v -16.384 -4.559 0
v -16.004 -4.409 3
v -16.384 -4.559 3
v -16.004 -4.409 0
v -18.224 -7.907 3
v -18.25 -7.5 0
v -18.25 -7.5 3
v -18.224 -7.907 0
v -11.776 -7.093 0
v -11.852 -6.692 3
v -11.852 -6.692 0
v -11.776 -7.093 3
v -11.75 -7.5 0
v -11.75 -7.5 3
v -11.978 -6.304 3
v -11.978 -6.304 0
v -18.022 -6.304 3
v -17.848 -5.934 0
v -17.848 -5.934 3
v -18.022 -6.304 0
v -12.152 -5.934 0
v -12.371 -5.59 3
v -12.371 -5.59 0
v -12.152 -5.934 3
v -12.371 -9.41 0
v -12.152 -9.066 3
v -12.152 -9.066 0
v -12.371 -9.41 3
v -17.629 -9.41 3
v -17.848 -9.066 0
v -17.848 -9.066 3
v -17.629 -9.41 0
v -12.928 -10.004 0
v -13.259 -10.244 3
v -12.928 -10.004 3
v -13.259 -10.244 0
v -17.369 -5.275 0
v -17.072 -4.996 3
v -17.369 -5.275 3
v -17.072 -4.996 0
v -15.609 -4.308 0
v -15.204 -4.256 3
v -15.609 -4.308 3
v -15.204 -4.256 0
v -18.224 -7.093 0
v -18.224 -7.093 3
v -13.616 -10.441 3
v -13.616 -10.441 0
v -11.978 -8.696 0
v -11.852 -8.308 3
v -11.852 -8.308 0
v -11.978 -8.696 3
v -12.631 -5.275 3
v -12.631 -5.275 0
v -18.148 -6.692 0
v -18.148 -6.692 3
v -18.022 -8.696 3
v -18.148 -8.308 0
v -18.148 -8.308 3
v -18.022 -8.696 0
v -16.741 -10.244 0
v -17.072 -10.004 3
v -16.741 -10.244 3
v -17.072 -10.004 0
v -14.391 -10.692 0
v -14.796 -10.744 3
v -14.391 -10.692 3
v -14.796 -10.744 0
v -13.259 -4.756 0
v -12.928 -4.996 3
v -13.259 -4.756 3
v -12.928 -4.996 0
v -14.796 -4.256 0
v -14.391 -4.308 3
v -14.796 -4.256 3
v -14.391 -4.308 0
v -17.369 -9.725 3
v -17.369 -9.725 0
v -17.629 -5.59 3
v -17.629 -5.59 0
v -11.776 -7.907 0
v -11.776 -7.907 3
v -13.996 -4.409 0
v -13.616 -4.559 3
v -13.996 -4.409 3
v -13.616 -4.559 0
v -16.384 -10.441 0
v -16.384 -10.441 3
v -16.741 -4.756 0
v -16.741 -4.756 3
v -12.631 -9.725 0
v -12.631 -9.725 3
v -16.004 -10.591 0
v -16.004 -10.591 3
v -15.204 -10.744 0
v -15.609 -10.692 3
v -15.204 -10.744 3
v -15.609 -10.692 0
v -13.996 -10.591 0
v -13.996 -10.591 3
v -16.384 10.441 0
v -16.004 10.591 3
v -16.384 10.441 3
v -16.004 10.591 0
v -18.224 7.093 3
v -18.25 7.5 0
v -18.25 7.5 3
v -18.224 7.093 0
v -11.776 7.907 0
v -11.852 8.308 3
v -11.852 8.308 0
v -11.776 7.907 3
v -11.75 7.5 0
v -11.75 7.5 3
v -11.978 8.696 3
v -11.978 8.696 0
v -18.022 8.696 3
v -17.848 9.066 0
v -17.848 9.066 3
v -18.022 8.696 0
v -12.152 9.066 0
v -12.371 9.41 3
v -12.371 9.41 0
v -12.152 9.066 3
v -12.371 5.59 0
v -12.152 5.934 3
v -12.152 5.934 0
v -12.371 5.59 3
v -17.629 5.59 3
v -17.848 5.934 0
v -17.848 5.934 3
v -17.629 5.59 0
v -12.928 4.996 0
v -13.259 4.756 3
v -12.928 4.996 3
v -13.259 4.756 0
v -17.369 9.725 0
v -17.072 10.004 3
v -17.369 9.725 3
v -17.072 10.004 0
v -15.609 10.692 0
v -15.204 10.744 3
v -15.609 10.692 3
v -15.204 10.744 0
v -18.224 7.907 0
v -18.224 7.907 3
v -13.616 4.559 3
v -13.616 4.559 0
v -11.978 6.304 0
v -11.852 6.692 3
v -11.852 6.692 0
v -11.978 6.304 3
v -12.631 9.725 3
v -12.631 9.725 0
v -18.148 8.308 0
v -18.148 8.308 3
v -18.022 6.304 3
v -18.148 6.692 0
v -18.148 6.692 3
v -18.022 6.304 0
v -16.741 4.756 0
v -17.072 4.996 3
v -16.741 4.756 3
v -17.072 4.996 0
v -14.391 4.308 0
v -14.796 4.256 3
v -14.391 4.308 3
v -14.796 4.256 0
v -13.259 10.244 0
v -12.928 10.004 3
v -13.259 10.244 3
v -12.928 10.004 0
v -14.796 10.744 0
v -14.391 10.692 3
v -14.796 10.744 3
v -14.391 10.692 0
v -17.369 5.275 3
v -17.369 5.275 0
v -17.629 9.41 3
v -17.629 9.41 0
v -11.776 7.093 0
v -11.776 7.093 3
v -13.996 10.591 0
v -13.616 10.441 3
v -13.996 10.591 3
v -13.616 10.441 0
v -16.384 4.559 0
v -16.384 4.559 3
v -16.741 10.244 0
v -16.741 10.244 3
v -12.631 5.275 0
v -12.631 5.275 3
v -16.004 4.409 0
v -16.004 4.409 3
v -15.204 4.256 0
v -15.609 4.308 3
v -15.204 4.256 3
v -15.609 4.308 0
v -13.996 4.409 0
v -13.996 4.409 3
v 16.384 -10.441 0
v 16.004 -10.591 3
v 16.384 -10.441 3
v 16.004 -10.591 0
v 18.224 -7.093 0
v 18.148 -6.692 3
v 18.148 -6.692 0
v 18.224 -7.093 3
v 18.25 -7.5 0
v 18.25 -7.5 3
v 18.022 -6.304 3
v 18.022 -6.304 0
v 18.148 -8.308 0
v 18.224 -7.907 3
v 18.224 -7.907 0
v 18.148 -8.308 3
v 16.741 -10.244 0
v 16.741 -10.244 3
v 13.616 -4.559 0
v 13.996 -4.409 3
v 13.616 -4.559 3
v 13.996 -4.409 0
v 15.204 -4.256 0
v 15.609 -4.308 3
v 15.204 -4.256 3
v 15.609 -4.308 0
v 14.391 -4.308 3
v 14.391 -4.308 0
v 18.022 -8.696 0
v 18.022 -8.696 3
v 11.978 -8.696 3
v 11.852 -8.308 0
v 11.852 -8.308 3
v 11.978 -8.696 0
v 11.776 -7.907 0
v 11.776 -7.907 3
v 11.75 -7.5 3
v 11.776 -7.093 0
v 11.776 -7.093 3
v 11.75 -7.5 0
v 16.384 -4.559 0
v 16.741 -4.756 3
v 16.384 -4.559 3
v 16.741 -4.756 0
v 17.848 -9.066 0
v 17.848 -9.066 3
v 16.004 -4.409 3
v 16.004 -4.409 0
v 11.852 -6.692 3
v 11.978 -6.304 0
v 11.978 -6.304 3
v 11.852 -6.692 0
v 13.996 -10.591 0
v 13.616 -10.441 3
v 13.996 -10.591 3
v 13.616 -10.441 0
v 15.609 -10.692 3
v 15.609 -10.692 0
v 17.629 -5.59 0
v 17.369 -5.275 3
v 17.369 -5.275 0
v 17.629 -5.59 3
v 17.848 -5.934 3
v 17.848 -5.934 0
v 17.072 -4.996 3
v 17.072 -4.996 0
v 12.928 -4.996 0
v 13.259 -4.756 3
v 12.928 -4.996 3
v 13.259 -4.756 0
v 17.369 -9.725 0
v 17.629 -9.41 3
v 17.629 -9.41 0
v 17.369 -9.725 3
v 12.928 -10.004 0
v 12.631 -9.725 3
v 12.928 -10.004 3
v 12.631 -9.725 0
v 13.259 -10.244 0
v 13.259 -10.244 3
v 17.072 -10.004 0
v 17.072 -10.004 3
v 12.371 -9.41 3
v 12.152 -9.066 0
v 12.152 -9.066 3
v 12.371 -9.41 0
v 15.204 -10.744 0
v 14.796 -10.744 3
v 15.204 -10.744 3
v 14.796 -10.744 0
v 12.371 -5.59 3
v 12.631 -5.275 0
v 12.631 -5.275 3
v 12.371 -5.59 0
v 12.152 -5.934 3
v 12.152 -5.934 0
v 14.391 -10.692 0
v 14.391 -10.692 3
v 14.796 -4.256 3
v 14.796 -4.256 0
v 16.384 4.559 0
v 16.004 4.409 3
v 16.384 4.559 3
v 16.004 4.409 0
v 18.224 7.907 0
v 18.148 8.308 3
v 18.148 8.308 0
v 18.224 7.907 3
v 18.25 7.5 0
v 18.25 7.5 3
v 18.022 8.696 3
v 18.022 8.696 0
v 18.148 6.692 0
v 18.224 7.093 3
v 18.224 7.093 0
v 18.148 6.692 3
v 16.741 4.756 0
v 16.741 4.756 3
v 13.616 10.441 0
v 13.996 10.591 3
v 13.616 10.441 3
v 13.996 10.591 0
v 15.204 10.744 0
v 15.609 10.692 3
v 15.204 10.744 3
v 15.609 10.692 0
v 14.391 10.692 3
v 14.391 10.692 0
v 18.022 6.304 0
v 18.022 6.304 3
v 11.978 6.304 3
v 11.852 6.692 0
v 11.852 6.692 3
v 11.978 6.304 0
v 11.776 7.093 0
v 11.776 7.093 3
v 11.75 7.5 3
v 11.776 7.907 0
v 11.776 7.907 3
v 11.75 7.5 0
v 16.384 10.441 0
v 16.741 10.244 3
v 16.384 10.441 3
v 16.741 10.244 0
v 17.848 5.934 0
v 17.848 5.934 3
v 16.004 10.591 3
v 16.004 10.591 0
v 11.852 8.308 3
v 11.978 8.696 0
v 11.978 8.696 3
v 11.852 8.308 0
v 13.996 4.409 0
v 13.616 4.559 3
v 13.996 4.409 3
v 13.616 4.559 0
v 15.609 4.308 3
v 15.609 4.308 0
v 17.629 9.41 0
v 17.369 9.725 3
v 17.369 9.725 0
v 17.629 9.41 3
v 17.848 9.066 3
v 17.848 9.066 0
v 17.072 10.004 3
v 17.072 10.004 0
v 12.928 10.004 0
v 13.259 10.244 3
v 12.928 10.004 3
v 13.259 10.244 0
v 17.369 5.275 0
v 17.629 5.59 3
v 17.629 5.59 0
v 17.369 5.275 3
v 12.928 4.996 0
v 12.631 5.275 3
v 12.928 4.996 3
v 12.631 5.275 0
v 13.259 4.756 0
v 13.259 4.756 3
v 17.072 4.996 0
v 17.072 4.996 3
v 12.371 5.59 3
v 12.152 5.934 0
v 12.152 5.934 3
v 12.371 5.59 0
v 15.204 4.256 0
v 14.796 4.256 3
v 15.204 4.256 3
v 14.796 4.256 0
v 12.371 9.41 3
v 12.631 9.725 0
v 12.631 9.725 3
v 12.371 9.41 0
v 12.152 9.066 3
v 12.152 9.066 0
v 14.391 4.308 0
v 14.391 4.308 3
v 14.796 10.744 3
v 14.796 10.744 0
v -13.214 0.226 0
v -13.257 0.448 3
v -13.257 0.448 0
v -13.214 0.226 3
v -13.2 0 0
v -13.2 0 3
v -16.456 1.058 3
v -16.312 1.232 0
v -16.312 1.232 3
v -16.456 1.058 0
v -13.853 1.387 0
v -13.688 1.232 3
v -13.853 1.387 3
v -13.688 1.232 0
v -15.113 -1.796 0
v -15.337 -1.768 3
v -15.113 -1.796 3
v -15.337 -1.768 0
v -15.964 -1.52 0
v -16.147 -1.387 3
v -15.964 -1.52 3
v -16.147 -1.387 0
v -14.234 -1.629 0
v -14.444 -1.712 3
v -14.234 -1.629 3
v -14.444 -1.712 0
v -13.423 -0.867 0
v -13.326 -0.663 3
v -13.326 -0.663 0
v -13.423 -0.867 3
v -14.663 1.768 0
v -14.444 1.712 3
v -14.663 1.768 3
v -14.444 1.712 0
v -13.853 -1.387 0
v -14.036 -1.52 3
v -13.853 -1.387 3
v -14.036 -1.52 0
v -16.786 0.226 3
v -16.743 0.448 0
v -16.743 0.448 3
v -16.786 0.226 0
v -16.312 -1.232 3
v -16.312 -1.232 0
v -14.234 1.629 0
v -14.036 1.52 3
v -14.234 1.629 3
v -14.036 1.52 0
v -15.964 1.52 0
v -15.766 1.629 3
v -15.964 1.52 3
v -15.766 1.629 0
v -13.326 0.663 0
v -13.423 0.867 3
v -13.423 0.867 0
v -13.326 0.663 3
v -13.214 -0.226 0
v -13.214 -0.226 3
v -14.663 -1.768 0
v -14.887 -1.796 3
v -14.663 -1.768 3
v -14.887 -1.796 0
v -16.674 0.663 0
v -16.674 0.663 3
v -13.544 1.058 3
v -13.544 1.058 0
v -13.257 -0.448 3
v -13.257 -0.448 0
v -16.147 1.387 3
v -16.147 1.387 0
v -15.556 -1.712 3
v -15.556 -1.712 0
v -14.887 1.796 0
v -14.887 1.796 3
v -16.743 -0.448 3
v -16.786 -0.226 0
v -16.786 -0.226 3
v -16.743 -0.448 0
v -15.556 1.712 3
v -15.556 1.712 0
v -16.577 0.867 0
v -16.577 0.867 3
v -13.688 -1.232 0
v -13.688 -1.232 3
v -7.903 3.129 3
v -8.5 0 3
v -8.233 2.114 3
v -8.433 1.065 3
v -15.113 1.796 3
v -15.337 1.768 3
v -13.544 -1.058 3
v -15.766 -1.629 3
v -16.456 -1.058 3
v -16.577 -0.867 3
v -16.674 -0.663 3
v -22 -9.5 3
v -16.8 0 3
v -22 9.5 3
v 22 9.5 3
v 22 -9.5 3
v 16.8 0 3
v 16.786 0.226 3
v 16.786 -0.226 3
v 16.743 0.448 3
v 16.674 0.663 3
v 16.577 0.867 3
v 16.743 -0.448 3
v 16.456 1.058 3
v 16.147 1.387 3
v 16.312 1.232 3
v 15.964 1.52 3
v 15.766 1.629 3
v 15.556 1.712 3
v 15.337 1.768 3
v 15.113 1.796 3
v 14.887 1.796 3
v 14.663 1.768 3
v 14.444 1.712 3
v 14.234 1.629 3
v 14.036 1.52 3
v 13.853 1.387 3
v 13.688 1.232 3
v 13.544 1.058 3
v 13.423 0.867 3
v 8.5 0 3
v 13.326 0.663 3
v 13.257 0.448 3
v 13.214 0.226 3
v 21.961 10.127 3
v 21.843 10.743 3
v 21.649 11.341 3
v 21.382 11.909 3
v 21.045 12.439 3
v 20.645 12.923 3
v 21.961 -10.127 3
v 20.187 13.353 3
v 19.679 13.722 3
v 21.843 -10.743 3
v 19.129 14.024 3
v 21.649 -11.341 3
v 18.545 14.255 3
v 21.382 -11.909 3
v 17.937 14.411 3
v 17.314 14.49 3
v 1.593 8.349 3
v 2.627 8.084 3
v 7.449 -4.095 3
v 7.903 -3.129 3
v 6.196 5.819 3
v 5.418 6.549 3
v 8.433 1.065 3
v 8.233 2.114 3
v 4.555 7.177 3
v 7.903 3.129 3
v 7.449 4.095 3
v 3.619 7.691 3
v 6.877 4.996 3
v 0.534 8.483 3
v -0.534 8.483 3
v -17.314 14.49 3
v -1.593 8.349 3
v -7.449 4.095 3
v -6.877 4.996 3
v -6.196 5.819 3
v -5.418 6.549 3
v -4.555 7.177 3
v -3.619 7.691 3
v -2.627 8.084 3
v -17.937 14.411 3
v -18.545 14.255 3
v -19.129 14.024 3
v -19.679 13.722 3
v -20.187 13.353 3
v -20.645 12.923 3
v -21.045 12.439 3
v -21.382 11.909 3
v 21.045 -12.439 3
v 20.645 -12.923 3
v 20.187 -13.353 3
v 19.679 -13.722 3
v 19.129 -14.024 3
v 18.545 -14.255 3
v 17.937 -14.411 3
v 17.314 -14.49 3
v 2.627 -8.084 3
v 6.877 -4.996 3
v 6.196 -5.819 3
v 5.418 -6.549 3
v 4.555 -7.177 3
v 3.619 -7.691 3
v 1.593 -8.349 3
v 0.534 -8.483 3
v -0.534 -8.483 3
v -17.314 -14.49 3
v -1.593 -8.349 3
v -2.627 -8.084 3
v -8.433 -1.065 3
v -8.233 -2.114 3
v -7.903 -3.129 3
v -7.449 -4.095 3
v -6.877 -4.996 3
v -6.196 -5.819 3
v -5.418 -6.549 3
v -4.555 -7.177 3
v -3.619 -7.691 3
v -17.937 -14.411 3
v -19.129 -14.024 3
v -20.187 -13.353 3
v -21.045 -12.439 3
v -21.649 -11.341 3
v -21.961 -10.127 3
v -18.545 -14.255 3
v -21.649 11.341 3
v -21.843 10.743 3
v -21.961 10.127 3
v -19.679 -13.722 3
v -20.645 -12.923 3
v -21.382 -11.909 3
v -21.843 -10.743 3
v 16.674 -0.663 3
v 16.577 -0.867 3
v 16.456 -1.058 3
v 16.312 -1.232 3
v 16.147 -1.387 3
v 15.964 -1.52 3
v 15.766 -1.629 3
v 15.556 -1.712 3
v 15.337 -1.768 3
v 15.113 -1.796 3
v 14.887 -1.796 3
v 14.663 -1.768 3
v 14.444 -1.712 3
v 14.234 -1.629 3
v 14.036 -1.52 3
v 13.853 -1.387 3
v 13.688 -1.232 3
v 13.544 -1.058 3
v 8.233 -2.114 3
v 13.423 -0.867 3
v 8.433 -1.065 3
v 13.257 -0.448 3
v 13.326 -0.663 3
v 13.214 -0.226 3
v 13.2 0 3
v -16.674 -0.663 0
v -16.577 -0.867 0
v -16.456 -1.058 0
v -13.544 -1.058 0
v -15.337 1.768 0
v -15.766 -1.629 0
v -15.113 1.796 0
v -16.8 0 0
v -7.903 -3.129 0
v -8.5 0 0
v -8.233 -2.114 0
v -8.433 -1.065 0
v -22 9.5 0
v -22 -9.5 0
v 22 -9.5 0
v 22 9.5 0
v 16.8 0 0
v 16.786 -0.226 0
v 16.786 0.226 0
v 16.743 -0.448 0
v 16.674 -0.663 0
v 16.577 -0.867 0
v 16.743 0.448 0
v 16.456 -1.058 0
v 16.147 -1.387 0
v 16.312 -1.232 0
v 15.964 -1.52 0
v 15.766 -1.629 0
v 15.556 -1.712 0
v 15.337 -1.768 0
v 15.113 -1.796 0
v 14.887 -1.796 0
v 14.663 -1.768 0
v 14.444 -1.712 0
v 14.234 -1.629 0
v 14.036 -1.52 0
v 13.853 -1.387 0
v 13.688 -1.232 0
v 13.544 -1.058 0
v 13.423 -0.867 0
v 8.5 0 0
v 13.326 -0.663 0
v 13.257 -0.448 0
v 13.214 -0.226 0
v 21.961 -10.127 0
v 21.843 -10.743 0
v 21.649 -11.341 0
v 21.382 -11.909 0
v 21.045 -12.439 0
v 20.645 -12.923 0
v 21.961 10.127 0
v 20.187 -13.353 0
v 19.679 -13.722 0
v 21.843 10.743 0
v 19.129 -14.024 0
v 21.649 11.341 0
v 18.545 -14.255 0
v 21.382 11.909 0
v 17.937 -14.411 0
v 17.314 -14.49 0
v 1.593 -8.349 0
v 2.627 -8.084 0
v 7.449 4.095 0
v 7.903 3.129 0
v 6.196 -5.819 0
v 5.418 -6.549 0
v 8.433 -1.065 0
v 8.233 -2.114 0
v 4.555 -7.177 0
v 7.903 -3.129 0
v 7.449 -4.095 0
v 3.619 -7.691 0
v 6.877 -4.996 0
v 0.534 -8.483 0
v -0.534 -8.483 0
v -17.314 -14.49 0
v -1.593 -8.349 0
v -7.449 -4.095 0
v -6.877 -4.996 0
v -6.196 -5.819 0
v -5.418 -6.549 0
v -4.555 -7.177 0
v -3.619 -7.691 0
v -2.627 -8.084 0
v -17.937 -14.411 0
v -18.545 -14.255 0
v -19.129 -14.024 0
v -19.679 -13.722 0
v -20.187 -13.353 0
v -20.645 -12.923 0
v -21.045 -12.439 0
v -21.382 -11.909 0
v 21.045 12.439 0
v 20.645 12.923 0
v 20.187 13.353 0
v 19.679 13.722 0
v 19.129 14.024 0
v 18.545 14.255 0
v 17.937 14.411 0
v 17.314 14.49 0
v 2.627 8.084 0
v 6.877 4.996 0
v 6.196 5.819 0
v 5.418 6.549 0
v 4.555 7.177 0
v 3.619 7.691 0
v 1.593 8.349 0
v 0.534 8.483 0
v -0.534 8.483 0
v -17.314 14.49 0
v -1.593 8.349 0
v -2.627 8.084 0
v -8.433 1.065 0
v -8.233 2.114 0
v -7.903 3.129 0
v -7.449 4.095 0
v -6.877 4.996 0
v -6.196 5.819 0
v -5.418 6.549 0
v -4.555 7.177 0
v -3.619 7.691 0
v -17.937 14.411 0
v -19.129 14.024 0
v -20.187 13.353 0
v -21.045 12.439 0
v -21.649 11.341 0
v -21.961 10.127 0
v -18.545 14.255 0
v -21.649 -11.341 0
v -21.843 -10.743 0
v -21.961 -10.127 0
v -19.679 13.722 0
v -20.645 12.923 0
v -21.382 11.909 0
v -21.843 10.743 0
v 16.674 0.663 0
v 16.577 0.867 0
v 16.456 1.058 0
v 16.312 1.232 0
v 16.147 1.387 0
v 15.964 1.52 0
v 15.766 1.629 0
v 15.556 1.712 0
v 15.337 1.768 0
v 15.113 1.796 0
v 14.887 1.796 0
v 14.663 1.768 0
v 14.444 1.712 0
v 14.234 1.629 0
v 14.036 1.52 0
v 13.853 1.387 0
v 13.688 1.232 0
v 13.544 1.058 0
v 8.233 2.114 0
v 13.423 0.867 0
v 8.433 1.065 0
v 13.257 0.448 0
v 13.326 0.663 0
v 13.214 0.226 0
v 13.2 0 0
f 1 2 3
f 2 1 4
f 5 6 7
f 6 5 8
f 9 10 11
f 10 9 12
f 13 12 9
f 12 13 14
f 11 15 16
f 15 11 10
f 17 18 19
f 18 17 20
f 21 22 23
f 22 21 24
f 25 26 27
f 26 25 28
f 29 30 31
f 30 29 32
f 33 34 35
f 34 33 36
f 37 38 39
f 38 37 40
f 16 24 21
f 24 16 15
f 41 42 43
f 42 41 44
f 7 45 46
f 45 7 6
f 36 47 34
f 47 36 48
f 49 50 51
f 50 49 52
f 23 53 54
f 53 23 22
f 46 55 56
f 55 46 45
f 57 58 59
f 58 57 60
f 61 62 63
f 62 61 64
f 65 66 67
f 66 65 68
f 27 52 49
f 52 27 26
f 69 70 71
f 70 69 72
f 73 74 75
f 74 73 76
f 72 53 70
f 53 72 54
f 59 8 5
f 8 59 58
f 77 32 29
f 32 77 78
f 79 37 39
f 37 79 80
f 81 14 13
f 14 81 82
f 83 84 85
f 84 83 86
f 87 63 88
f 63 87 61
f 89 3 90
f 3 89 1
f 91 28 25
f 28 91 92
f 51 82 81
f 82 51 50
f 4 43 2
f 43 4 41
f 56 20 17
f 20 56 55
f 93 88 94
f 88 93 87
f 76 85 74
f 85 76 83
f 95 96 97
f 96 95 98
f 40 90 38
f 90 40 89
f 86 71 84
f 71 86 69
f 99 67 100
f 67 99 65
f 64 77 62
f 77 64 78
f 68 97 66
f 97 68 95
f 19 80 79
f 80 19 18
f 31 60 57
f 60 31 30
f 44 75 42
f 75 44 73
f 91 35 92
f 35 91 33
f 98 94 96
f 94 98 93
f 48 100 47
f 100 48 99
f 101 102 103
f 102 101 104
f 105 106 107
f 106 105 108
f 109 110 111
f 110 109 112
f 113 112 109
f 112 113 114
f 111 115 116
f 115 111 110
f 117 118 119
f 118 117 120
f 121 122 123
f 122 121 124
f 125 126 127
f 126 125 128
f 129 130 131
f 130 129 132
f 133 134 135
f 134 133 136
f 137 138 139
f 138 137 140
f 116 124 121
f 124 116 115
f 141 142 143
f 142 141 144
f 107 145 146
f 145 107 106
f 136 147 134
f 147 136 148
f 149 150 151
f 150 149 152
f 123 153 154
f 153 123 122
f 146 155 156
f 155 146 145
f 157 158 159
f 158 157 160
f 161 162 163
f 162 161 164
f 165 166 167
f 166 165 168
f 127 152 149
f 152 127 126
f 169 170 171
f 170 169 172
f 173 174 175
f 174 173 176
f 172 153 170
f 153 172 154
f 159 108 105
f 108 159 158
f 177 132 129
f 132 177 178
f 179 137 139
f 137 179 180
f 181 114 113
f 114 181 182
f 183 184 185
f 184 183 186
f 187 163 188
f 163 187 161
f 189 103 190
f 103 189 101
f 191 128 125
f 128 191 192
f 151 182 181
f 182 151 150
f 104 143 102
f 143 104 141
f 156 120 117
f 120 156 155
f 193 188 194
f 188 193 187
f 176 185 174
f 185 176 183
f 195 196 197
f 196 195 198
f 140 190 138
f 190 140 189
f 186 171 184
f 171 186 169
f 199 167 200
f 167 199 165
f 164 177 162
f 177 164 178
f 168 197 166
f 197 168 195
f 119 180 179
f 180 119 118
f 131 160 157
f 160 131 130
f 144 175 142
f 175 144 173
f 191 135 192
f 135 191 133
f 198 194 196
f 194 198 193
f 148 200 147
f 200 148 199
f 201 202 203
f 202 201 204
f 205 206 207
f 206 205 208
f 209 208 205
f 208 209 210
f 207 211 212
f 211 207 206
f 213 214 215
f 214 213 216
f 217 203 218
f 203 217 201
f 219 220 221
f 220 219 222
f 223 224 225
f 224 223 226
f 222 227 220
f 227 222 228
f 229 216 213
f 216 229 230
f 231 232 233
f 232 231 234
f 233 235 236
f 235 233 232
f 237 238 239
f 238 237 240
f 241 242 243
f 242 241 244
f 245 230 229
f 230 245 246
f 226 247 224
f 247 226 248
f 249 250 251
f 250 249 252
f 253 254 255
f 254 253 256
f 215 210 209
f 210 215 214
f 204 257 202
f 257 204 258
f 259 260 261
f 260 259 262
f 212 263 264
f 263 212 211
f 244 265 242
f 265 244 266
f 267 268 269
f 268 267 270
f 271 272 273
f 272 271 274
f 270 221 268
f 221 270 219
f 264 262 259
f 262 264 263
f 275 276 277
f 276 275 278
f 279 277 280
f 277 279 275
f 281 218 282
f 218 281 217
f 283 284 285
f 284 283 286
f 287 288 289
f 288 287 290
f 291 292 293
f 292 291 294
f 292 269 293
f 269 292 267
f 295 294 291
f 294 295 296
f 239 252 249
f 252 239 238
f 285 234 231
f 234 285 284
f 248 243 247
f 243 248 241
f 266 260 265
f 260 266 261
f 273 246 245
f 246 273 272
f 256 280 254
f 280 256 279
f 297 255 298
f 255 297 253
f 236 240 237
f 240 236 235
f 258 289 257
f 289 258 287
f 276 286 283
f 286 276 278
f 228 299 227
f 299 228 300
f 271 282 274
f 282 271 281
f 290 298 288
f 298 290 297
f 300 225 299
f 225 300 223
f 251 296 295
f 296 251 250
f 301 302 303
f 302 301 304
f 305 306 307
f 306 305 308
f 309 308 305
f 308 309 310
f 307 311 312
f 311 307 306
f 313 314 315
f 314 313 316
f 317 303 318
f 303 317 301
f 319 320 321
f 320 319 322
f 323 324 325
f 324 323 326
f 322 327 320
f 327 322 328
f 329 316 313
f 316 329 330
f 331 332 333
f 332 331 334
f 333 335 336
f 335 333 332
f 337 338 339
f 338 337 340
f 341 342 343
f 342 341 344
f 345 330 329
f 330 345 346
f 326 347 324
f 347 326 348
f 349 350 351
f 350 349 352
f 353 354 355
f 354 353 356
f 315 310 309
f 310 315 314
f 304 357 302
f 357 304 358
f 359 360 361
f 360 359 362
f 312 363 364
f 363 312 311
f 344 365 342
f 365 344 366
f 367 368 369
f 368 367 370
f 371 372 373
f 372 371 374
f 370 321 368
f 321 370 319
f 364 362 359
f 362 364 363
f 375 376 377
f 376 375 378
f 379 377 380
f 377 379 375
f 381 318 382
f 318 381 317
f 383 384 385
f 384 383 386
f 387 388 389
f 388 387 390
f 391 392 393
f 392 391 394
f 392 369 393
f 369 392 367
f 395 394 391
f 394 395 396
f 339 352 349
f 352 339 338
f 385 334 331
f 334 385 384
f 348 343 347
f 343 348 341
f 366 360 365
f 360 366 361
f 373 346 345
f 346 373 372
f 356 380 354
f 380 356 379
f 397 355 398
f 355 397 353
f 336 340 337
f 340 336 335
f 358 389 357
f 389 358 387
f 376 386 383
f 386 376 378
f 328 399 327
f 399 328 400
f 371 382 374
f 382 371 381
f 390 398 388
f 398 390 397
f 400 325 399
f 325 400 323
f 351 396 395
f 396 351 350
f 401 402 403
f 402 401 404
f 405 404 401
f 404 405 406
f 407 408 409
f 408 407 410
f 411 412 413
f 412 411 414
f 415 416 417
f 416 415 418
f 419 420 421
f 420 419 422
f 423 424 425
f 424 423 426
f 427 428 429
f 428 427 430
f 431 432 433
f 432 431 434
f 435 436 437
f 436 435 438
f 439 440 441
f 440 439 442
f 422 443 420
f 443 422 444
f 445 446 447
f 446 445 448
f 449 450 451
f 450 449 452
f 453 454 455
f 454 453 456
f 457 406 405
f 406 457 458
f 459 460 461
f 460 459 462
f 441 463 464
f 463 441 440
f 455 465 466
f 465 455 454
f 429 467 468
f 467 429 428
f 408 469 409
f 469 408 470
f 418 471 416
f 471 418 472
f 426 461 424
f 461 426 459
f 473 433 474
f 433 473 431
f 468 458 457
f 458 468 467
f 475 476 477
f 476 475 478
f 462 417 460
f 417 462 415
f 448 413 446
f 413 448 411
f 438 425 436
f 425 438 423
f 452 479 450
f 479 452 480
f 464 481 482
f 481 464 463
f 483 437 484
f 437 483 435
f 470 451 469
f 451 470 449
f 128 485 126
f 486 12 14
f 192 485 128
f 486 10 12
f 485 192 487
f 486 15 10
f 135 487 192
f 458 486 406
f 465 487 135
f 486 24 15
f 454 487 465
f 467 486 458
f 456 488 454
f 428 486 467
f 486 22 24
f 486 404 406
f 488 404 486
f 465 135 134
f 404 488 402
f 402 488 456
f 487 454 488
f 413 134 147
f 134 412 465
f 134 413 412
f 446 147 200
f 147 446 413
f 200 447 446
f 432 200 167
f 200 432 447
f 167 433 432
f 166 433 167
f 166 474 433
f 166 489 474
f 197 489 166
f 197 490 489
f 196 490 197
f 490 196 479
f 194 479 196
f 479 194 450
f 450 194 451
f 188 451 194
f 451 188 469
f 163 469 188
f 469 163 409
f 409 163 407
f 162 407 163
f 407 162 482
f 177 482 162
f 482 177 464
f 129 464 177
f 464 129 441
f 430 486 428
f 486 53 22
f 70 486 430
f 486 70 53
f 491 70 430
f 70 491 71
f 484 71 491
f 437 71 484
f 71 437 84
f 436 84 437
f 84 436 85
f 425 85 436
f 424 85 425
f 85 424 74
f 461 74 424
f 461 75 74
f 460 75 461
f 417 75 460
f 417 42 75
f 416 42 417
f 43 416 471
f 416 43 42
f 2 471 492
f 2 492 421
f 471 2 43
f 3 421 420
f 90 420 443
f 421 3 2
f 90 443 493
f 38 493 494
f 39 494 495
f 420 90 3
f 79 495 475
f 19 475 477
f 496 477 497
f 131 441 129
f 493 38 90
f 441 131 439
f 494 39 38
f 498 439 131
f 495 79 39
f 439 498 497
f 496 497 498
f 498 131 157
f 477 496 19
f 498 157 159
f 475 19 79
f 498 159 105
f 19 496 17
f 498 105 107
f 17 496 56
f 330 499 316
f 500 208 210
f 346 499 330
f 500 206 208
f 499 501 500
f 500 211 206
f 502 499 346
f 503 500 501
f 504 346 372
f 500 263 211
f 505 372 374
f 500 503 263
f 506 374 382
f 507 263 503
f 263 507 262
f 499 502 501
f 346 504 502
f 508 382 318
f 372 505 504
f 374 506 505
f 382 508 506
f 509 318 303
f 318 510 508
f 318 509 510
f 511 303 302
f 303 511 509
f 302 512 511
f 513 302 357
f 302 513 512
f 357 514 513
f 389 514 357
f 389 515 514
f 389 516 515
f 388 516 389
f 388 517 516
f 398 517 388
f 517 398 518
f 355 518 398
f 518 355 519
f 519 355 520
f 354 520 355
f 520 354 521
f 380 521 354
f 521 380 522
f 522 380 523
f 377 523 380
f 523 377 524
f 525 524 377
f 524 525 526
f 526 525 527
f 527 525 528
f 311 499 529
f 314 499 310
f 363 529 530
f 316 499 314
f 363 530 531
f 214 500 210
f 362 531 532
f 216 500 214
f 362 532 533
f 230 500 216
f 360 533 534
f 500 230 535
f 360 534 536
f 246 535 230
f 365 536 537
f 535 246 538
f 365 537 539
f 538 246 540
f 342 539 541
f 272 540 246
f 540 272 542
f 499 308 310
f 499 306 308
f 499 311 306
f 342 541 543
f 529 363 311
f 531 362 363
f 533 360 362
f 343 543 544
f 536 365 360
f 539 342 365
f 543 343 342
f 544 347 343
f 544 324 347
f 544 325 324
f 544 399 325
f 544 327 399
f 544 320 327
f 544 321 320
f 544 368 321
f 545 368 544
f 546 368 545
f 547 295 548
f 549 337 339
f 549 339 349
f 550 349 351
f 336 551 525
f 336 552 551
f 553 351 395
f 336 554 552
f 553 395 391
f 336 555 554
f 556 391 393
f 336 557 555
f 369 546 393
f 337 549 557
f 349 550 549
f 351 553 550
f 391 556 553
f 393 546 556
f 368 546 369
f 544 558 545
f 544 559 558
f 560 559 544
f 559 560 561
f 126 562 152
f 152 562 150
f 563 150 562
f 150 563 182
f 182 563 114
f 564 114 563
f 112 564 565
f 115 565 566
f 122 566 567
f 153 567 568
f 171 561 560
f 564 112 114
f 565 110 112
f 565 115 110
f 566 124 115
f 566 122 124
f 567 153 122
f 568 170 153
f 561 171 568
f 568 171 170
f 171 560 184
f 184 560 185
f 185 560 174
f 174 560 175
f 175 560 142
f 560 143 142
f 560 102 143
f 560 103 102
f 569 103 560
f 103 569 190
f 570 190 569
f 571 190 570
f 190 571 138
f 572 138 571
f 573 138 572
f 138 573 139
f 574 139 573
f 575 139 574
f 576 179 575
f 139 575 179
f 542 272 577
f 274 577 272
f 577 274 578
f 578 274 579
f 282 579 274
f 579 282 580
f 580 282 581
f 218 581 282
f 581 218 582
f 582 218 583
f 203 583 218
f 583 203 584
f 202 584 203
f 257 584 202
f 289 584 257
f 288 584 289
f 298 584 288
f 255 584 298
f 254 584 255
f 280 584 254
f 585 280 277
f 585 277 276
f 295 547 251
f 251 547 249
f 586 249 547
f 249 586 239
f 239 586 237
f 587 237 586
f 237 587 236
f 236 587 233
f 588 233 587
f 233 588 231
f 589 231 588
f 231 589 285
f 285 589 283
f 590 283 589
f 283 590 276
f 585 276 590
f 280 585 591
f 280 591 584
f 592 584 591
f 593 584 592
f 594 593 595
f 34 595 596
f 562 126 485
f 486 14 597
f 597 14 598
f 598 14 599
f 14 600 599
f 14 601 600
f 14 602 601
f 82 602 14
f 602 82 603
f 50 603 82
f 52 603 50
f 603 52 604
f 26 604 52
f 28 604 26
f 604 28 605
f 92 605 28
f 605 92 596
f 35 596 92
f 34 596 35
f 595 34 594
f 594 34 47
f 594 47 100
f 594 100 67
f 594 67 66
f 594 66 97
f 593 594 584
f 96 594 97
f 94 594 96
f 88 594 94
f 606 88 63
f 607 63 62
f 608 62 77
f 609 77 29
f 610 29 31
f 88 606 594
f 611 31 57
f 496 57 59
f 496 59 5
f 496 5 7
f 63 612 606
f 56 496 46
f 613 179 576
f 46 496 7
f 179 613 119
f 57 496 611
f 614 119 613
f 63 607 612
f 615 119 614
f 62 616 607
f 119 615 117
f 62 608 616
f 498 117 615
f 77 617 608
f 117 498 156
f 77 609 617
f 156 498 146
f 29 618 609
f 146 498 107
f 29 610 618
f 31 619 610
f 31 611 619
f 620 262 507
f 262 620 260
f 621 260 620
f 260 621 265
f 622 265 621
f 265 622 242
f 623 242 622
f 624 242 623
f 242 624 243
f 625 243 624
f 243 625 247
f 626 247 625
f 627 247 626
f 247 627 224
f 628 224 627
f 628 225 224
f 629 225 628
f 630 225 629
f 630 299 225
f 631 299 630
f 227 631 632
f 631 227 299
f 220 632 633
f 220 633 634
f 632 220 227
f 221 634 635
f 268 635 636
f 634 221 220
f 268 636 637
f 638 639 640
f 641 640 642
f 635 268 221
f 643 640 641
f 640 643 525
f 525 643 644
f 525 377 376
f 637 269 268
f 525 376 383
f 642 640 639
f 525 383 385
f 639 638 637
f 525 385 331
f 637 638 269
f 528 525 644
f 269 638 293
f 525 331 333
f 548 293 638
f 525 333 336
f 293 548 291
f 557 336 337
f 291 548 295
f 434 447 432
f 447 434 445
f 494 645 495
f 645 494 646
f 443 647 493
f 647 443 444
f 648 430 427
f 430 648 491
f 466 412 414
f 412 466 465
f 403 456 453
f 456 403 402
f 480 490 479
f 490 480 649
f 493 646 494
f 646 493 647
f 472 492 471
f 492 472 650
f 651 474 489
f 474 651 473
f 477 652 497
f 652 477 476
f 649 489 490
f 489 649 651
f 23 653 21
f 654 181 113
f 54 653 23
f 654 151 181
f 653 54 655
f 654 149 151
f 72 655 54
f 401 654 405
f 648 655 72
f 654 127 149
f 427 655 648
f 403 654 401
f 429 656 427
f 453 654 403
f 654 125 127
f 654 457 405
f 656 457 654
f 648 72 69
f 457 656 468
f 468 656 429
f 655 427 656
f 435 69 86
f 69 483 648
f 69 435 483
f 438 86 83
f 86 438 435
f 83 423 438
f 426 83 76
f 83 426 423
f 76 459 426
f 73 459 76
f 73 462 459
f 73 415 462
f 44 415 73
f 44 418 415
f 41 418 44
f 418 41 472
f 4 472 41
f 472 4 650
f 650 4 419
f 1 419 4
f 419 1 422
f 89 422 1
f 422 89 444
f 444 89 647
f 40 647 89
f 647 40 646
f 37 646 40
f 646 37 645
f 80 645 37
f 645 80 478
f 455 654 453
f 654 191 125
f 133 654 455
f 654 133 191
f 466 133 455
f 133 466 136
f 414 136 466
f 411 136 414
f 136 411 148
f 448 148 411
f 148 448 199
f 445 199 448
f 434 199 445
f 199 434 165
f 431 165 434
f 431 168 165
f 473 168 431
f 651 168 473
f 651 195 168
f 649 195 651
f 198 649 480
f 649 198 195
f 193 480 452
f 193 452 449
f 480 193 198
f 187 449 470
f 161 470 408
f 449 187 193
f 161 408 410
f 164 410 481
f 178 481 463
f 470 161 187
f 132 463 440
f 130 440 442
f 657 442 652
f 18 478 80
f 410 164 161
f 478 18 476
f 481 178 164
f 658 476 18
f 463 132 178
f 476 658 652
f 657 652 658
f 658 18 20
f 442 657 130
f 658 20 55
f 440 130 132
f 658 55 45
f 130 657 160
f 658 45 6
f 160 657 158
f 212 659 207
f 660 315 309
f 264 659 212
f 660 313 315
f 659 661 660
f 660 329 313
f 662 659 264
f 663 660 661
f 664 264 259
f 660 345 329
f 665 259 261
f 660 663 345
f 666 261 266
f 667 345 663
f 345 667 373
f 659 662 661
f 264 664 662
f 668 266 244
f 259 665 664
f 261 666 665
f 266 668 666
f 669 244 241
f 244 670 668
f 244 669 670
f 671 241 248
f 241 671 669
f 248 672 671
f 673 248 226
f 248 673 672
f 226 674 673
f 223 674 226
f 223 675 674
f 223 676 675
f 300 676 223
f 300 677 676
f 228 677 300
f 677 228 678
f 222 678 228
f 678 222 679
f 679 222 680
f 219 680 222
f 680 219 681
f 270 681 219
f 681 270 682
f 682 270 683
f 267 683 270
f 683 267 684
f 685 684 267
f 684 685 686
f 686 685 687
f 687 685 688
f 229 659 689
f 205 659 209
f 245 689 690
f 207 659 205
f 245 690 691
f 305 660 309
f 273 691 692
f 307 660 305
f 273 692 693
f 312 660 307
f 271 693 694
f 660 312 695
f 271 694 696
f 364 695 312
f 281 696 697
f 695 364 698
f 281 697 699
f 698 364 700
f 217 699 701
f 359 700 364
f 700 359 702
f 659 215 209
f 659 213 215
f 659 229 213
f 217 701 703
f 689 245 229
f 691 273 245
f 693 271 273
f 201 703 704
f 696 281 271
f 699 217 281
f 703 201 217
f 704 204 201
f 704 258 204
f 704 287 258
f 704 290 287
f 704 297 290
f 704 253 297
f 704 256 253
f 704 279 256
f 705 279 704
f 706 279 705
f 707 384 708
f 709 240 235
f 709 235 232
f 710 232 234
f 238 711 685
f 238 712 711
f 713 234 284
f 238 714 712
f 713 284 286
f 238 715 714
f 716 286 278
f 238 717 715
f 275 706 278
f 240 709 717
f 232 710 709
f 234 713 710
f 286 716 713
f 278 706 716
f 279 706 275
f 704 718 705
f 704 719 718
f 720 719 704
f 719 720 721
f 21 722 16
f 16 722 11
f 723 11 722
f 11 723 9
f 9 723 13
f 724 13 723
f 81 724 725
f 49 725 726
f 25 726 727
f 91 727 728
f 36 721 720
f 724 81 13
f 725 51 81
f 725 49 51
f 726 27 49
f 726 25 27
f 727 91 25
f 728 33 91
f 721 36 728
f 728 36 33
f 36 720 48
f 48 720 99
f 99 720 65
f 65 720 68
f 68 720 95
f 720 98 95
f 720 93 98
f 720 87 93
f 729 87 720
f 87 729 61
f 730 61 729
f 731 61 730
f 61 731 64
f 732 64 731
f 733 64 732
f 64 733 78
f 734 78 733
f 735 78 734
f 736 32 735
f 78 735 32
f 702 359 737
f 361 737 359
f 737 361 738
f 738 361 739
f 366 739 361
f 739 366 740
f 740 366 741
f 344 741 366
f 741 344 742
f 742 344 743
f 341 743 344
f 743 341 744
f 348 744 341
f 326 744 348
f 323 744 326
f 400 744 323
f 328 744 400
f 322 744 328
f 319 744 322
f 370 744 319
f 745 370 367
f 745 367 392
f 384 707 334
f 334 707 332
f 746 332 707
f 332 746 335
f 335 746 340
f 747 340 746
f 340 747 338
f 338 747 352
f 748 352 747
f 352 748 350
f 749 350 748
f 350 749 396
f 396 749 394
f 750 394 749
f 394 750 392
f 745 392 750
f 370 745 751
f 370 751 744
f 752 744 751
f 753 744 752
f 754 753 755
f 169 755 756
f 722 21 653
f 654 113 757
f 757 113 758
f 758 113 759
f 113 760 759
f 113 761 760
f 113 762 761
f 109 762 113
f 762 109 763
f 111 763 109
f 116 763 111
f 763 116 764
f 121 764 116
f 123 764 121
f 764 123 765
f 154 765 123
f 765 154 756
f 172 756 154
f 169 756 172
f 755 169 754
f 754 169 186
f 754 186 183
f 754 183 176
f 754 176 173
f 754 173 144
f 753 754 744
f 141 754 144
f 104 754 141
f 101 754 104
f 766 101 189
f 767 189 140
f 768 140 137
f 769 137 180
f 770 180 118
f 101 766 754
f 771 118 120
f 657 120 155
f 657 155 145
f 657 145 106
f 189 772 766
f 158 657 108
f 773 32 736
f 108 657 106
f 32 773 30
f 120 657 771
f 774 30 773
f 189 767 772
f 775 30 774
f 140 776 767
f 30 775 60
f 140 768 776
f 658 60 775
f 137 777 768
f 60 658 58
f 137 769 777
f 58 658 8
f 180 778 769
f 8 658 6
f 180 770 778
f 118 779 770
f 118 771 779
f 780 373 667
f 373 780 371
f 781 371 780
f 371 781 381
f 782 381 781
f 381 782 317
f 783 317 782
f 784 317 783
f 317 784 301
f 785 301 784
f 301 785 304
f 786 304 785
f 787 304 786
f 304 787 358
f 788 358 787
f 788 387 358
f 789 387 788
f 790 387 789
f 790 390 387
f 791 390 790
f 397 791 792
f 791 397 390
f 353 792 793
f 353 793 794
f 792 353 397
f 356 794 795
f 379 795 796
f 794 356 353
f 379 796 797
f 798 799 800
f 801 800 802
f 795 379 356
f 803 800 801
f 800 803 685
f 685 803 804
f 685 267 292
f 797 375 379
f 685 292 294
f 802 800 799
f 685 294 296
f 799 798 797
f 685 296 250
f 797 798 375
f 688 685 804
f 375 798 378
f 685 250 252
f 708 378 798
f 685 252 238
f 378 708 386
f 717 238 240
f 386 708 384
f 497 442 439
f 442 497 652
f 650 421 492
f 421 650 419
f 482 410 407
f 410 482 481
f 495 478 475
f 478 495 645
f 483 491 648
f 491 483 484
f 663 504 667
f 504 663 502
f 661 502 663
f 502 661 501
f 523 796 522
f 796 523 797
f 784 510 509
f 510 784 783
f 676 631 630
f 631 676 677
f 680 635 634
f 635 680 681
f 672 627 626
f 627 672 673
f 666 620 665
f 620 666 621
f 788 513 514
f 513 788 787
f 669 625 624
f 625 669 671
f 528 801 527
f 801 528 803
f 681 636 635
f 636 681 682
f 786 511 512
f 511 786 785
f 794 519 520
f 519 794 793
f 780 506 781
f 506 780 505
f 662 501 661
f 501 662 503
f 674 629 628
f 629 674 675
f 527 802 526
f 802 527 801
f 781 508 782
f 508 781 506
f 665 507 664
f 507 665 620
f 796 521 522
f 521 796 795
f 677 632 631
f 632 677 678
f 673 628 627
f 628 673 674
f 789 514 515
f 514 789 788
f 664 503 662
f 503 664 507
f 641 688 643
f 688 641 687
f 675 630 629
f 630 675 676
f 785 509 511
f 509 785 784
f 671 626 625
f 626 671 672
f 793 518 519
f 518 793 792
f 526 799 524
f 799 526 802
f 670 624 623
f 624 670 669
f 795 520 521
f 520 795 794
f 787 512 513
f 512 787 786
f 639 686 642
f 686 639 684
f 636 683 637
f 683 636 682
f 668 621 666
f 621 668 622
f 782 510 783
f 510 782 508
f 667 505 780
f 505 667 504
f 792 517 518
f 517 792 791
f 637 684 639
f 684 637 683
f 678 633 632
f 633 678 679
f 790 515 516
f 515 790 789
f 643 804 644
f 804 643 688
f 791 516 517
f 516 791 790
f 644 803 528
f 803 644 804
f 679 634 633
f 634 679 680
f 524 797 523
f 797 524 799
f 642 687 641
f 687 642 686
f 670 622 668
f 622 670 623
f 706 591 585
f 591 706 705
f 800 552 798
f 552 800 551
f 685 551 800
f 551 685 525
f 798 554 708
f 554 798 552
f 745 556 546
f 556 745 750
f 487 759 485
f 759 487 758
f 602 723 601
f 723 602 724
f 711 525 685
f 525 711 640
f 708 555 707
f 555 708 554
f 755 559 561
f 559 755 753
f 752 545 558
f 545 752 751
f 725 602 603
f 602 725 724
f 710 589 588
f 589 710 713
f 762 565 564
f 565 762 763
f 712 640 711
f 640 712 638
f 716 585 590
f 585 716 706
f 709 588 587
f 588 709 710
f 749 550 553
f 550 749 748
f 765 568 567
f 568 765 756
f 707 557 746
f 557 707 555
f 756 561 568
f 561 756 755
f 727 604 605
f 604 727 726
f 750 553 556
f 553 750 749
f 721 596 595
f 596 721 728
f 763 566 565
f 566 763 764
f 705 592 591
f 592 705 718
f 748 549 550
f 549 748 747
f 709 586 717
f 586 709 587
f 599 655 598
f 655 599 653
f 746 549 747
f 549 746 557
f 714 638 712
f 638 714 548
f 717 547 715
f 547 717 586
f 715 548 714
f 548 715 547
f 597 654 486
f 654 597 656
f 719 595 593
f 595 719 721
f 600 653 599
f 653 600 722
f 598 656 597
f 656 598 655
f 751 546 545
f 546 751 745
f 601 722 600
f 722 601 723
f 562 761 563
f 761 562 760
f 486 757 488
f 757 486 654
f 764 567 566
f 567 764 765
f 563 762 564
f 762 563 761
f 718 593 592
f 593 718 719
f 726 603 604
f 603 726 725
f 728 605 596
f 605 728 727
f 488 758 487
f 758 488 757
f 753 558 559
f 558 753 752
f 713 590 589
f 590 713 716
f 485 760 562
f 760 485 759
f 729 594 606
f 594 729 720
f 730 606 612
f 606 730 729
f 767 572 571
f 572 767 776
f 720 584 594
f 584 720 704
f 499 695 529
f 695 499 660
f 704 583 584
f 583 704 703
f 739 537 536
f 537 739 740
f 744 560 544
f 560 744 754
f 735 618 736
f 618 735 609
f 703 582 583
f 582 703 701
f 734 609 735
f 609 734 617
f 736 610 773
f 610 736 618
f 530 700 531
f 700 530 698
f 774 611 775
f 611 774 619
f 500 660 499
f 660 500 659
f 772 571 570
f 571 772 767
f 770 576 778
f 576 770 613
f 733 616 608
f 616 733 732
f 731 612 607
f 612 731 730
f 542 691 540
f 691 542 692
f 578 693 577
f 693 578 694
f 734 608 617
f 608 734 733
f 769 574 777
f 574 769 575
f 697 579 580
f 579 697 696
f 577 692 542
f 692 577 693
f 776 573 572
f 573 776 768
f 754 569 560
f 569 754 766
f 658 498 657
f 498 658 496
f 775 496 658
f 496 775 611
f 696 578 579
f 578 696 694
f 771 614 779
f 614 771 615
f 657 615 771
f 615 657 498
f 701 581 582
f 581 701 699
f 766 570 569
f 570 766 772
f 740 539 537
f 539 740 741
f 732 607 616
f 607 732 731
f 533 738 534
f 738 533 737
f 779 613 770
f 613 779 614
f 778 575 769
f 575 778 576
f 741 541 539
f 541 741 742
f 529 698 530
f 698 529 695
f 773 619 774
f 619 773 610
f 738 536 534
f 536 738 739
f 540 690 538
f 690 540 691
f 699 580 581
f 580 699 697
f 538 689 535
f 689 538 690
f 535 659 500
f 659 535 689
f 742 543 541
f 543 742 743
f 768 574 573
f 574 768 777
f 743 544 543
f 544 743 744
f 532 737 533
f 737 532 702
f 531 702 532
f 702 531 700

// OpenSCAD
$fn = 50;


difference() {
	union() {
		hull() {
			translate(v = [-17.0000000000, 9.5000000000, 0]) {
				cylinder(h = 3, r = 5);
			}
			translate(v = [17.0000000000, 9.5000000000, 0]) {
				cylinder(h = 3, r = 5);
			}
			translate(v = [-17.0000000000, -9.5000000000, 0]) {
				cylinder(h = 3, r = 5);
			}
			translate(v = [17.0000000000, -9.5000000000, 0]) {
				cylinder(h = 3, r = 5);
			}
		}
	}
	union() {
		#translate(v = [-15.0000000000, -7.5000000000, 0]) {
			cylinder(h = 3, r = 3.2500000000);
		}
		#translate(v = [-15.0000000000, 7.5000000000, 0]) {
			cylinder(h = 3, r = 3.2500000000);
		}
		#translate(v = [15.0000000000, -7.5000000000, 0]) {
			cylinder(h = 3, r = 3.2500000000);
		}
		#translate(v = [15.0000000000, 7.5000000000, 0]) {
			cylinder(h = 3, r = 3.2500000000);
		}
		#translate(v = [-15.0000000000, -7.5000000000, -100.0000000000]) {
			cylinder(h = 200, r = 3.2500000000);
		}
		#translate(v = [-15.0000000000, 7.5000000000, -100.0000000000]) {
			cylinder(h = 200, r = 3.2500000000);
		}
		#translate(v = [15.0000000000, -7.5000000000, -100.0000000000]) {
			cylinder(h = 200, r = 3.2500000000);
		}
		#translate(v = [15.0000000000, 7.5000000000, -100.0000000000]) {
			cylinder(h = 200, r = 3.2500000000);
		}
		#translate(v = [-15.0000000000, -7.5000000000, 0]) {
			cylinder(h = 3, r = 1.8000000000);
		}
		#translate(v = [-15.0000000000, 0.0000000000, 0]) {
			cylinder(h = 3, r = 1.8000000000);
		}
		#translate(v = [-15.0000000000, 7.5000000000, 0]) {
			cylinder(h = 3, r = 1.8000000000);
		}
		#translate(v = [15.0000000000, -7.5000000000, 0]) {
			cylinder(h = 3, r = 1.8000000000);
		}
		#translate(v = [15.0000000000, 0.0000000000, 0]) {
			cylinder(h = 3, r = 1.8000000000);
		}
		#translate(v = [15.0000000000, 7.5000000000, 0]) {
			cylinder(h = 3, r = 1.8000000000);
		}
		#translate(v = [-15.0000000000, -7.5000000000, 0]) {
			cylinder(h = 3, r = 1.8000000000);
		}
		#translate(v = [-15.0000000000, 0.0000000000, 0]) {
			cylinder(h = 3, r = 1.8000000000);
		}
		#translate(v = [-15.0000000000, 7.5000000000, 0]) {
			cylinder(h = 3, r = 1.8000000000);
		}
		#translate(v = [15.0000000000, -7.5000000000, 0]) {
			cylinder(h = 3, r = 1.8000000000);
		}
		#translate(v = [15.0000000000, 0.0000000000, 0]) {
			cylinder(h = 3, r = 1.8000000000);
		}
		#translate(v = [15.0000000000, 7.5000000000, 0]) {
			cylinder(h = 3, r = 1.8000000000);
		}
		#translate(v = [-15.0000000000, -7.5000000000, 0]) {
			cylinder(h = 3, r = 1.8000000000);
		}
		#translate(v = [-15.0000000000, 0.0000000000, 0]) {
			cylinder(h = 3, r = 1.8000000000);
		}
		#translate(v = [-15.0000000000, 7.5000000000, 0]) {
			cylinder(h = 3, r = 1.8000000000);
		}
		#translate(v = [15.0000000000, -7.5000000000, 0]) {
			cylinder(h = 3, r = 1.8000000000);
		}
		#translate(v = [15.0000000000, 0.0000000000, 0]) {
			cylinder(h = 3, r = 1.8000000000);
		}
		#translate(v = [15.0000000000, 7.5000000000, 0]) {
			cylinder(h = 3, r = 1.8000000000);
		}
		#cylinder(h = 3, r = 8.5000000000);
	}
}
